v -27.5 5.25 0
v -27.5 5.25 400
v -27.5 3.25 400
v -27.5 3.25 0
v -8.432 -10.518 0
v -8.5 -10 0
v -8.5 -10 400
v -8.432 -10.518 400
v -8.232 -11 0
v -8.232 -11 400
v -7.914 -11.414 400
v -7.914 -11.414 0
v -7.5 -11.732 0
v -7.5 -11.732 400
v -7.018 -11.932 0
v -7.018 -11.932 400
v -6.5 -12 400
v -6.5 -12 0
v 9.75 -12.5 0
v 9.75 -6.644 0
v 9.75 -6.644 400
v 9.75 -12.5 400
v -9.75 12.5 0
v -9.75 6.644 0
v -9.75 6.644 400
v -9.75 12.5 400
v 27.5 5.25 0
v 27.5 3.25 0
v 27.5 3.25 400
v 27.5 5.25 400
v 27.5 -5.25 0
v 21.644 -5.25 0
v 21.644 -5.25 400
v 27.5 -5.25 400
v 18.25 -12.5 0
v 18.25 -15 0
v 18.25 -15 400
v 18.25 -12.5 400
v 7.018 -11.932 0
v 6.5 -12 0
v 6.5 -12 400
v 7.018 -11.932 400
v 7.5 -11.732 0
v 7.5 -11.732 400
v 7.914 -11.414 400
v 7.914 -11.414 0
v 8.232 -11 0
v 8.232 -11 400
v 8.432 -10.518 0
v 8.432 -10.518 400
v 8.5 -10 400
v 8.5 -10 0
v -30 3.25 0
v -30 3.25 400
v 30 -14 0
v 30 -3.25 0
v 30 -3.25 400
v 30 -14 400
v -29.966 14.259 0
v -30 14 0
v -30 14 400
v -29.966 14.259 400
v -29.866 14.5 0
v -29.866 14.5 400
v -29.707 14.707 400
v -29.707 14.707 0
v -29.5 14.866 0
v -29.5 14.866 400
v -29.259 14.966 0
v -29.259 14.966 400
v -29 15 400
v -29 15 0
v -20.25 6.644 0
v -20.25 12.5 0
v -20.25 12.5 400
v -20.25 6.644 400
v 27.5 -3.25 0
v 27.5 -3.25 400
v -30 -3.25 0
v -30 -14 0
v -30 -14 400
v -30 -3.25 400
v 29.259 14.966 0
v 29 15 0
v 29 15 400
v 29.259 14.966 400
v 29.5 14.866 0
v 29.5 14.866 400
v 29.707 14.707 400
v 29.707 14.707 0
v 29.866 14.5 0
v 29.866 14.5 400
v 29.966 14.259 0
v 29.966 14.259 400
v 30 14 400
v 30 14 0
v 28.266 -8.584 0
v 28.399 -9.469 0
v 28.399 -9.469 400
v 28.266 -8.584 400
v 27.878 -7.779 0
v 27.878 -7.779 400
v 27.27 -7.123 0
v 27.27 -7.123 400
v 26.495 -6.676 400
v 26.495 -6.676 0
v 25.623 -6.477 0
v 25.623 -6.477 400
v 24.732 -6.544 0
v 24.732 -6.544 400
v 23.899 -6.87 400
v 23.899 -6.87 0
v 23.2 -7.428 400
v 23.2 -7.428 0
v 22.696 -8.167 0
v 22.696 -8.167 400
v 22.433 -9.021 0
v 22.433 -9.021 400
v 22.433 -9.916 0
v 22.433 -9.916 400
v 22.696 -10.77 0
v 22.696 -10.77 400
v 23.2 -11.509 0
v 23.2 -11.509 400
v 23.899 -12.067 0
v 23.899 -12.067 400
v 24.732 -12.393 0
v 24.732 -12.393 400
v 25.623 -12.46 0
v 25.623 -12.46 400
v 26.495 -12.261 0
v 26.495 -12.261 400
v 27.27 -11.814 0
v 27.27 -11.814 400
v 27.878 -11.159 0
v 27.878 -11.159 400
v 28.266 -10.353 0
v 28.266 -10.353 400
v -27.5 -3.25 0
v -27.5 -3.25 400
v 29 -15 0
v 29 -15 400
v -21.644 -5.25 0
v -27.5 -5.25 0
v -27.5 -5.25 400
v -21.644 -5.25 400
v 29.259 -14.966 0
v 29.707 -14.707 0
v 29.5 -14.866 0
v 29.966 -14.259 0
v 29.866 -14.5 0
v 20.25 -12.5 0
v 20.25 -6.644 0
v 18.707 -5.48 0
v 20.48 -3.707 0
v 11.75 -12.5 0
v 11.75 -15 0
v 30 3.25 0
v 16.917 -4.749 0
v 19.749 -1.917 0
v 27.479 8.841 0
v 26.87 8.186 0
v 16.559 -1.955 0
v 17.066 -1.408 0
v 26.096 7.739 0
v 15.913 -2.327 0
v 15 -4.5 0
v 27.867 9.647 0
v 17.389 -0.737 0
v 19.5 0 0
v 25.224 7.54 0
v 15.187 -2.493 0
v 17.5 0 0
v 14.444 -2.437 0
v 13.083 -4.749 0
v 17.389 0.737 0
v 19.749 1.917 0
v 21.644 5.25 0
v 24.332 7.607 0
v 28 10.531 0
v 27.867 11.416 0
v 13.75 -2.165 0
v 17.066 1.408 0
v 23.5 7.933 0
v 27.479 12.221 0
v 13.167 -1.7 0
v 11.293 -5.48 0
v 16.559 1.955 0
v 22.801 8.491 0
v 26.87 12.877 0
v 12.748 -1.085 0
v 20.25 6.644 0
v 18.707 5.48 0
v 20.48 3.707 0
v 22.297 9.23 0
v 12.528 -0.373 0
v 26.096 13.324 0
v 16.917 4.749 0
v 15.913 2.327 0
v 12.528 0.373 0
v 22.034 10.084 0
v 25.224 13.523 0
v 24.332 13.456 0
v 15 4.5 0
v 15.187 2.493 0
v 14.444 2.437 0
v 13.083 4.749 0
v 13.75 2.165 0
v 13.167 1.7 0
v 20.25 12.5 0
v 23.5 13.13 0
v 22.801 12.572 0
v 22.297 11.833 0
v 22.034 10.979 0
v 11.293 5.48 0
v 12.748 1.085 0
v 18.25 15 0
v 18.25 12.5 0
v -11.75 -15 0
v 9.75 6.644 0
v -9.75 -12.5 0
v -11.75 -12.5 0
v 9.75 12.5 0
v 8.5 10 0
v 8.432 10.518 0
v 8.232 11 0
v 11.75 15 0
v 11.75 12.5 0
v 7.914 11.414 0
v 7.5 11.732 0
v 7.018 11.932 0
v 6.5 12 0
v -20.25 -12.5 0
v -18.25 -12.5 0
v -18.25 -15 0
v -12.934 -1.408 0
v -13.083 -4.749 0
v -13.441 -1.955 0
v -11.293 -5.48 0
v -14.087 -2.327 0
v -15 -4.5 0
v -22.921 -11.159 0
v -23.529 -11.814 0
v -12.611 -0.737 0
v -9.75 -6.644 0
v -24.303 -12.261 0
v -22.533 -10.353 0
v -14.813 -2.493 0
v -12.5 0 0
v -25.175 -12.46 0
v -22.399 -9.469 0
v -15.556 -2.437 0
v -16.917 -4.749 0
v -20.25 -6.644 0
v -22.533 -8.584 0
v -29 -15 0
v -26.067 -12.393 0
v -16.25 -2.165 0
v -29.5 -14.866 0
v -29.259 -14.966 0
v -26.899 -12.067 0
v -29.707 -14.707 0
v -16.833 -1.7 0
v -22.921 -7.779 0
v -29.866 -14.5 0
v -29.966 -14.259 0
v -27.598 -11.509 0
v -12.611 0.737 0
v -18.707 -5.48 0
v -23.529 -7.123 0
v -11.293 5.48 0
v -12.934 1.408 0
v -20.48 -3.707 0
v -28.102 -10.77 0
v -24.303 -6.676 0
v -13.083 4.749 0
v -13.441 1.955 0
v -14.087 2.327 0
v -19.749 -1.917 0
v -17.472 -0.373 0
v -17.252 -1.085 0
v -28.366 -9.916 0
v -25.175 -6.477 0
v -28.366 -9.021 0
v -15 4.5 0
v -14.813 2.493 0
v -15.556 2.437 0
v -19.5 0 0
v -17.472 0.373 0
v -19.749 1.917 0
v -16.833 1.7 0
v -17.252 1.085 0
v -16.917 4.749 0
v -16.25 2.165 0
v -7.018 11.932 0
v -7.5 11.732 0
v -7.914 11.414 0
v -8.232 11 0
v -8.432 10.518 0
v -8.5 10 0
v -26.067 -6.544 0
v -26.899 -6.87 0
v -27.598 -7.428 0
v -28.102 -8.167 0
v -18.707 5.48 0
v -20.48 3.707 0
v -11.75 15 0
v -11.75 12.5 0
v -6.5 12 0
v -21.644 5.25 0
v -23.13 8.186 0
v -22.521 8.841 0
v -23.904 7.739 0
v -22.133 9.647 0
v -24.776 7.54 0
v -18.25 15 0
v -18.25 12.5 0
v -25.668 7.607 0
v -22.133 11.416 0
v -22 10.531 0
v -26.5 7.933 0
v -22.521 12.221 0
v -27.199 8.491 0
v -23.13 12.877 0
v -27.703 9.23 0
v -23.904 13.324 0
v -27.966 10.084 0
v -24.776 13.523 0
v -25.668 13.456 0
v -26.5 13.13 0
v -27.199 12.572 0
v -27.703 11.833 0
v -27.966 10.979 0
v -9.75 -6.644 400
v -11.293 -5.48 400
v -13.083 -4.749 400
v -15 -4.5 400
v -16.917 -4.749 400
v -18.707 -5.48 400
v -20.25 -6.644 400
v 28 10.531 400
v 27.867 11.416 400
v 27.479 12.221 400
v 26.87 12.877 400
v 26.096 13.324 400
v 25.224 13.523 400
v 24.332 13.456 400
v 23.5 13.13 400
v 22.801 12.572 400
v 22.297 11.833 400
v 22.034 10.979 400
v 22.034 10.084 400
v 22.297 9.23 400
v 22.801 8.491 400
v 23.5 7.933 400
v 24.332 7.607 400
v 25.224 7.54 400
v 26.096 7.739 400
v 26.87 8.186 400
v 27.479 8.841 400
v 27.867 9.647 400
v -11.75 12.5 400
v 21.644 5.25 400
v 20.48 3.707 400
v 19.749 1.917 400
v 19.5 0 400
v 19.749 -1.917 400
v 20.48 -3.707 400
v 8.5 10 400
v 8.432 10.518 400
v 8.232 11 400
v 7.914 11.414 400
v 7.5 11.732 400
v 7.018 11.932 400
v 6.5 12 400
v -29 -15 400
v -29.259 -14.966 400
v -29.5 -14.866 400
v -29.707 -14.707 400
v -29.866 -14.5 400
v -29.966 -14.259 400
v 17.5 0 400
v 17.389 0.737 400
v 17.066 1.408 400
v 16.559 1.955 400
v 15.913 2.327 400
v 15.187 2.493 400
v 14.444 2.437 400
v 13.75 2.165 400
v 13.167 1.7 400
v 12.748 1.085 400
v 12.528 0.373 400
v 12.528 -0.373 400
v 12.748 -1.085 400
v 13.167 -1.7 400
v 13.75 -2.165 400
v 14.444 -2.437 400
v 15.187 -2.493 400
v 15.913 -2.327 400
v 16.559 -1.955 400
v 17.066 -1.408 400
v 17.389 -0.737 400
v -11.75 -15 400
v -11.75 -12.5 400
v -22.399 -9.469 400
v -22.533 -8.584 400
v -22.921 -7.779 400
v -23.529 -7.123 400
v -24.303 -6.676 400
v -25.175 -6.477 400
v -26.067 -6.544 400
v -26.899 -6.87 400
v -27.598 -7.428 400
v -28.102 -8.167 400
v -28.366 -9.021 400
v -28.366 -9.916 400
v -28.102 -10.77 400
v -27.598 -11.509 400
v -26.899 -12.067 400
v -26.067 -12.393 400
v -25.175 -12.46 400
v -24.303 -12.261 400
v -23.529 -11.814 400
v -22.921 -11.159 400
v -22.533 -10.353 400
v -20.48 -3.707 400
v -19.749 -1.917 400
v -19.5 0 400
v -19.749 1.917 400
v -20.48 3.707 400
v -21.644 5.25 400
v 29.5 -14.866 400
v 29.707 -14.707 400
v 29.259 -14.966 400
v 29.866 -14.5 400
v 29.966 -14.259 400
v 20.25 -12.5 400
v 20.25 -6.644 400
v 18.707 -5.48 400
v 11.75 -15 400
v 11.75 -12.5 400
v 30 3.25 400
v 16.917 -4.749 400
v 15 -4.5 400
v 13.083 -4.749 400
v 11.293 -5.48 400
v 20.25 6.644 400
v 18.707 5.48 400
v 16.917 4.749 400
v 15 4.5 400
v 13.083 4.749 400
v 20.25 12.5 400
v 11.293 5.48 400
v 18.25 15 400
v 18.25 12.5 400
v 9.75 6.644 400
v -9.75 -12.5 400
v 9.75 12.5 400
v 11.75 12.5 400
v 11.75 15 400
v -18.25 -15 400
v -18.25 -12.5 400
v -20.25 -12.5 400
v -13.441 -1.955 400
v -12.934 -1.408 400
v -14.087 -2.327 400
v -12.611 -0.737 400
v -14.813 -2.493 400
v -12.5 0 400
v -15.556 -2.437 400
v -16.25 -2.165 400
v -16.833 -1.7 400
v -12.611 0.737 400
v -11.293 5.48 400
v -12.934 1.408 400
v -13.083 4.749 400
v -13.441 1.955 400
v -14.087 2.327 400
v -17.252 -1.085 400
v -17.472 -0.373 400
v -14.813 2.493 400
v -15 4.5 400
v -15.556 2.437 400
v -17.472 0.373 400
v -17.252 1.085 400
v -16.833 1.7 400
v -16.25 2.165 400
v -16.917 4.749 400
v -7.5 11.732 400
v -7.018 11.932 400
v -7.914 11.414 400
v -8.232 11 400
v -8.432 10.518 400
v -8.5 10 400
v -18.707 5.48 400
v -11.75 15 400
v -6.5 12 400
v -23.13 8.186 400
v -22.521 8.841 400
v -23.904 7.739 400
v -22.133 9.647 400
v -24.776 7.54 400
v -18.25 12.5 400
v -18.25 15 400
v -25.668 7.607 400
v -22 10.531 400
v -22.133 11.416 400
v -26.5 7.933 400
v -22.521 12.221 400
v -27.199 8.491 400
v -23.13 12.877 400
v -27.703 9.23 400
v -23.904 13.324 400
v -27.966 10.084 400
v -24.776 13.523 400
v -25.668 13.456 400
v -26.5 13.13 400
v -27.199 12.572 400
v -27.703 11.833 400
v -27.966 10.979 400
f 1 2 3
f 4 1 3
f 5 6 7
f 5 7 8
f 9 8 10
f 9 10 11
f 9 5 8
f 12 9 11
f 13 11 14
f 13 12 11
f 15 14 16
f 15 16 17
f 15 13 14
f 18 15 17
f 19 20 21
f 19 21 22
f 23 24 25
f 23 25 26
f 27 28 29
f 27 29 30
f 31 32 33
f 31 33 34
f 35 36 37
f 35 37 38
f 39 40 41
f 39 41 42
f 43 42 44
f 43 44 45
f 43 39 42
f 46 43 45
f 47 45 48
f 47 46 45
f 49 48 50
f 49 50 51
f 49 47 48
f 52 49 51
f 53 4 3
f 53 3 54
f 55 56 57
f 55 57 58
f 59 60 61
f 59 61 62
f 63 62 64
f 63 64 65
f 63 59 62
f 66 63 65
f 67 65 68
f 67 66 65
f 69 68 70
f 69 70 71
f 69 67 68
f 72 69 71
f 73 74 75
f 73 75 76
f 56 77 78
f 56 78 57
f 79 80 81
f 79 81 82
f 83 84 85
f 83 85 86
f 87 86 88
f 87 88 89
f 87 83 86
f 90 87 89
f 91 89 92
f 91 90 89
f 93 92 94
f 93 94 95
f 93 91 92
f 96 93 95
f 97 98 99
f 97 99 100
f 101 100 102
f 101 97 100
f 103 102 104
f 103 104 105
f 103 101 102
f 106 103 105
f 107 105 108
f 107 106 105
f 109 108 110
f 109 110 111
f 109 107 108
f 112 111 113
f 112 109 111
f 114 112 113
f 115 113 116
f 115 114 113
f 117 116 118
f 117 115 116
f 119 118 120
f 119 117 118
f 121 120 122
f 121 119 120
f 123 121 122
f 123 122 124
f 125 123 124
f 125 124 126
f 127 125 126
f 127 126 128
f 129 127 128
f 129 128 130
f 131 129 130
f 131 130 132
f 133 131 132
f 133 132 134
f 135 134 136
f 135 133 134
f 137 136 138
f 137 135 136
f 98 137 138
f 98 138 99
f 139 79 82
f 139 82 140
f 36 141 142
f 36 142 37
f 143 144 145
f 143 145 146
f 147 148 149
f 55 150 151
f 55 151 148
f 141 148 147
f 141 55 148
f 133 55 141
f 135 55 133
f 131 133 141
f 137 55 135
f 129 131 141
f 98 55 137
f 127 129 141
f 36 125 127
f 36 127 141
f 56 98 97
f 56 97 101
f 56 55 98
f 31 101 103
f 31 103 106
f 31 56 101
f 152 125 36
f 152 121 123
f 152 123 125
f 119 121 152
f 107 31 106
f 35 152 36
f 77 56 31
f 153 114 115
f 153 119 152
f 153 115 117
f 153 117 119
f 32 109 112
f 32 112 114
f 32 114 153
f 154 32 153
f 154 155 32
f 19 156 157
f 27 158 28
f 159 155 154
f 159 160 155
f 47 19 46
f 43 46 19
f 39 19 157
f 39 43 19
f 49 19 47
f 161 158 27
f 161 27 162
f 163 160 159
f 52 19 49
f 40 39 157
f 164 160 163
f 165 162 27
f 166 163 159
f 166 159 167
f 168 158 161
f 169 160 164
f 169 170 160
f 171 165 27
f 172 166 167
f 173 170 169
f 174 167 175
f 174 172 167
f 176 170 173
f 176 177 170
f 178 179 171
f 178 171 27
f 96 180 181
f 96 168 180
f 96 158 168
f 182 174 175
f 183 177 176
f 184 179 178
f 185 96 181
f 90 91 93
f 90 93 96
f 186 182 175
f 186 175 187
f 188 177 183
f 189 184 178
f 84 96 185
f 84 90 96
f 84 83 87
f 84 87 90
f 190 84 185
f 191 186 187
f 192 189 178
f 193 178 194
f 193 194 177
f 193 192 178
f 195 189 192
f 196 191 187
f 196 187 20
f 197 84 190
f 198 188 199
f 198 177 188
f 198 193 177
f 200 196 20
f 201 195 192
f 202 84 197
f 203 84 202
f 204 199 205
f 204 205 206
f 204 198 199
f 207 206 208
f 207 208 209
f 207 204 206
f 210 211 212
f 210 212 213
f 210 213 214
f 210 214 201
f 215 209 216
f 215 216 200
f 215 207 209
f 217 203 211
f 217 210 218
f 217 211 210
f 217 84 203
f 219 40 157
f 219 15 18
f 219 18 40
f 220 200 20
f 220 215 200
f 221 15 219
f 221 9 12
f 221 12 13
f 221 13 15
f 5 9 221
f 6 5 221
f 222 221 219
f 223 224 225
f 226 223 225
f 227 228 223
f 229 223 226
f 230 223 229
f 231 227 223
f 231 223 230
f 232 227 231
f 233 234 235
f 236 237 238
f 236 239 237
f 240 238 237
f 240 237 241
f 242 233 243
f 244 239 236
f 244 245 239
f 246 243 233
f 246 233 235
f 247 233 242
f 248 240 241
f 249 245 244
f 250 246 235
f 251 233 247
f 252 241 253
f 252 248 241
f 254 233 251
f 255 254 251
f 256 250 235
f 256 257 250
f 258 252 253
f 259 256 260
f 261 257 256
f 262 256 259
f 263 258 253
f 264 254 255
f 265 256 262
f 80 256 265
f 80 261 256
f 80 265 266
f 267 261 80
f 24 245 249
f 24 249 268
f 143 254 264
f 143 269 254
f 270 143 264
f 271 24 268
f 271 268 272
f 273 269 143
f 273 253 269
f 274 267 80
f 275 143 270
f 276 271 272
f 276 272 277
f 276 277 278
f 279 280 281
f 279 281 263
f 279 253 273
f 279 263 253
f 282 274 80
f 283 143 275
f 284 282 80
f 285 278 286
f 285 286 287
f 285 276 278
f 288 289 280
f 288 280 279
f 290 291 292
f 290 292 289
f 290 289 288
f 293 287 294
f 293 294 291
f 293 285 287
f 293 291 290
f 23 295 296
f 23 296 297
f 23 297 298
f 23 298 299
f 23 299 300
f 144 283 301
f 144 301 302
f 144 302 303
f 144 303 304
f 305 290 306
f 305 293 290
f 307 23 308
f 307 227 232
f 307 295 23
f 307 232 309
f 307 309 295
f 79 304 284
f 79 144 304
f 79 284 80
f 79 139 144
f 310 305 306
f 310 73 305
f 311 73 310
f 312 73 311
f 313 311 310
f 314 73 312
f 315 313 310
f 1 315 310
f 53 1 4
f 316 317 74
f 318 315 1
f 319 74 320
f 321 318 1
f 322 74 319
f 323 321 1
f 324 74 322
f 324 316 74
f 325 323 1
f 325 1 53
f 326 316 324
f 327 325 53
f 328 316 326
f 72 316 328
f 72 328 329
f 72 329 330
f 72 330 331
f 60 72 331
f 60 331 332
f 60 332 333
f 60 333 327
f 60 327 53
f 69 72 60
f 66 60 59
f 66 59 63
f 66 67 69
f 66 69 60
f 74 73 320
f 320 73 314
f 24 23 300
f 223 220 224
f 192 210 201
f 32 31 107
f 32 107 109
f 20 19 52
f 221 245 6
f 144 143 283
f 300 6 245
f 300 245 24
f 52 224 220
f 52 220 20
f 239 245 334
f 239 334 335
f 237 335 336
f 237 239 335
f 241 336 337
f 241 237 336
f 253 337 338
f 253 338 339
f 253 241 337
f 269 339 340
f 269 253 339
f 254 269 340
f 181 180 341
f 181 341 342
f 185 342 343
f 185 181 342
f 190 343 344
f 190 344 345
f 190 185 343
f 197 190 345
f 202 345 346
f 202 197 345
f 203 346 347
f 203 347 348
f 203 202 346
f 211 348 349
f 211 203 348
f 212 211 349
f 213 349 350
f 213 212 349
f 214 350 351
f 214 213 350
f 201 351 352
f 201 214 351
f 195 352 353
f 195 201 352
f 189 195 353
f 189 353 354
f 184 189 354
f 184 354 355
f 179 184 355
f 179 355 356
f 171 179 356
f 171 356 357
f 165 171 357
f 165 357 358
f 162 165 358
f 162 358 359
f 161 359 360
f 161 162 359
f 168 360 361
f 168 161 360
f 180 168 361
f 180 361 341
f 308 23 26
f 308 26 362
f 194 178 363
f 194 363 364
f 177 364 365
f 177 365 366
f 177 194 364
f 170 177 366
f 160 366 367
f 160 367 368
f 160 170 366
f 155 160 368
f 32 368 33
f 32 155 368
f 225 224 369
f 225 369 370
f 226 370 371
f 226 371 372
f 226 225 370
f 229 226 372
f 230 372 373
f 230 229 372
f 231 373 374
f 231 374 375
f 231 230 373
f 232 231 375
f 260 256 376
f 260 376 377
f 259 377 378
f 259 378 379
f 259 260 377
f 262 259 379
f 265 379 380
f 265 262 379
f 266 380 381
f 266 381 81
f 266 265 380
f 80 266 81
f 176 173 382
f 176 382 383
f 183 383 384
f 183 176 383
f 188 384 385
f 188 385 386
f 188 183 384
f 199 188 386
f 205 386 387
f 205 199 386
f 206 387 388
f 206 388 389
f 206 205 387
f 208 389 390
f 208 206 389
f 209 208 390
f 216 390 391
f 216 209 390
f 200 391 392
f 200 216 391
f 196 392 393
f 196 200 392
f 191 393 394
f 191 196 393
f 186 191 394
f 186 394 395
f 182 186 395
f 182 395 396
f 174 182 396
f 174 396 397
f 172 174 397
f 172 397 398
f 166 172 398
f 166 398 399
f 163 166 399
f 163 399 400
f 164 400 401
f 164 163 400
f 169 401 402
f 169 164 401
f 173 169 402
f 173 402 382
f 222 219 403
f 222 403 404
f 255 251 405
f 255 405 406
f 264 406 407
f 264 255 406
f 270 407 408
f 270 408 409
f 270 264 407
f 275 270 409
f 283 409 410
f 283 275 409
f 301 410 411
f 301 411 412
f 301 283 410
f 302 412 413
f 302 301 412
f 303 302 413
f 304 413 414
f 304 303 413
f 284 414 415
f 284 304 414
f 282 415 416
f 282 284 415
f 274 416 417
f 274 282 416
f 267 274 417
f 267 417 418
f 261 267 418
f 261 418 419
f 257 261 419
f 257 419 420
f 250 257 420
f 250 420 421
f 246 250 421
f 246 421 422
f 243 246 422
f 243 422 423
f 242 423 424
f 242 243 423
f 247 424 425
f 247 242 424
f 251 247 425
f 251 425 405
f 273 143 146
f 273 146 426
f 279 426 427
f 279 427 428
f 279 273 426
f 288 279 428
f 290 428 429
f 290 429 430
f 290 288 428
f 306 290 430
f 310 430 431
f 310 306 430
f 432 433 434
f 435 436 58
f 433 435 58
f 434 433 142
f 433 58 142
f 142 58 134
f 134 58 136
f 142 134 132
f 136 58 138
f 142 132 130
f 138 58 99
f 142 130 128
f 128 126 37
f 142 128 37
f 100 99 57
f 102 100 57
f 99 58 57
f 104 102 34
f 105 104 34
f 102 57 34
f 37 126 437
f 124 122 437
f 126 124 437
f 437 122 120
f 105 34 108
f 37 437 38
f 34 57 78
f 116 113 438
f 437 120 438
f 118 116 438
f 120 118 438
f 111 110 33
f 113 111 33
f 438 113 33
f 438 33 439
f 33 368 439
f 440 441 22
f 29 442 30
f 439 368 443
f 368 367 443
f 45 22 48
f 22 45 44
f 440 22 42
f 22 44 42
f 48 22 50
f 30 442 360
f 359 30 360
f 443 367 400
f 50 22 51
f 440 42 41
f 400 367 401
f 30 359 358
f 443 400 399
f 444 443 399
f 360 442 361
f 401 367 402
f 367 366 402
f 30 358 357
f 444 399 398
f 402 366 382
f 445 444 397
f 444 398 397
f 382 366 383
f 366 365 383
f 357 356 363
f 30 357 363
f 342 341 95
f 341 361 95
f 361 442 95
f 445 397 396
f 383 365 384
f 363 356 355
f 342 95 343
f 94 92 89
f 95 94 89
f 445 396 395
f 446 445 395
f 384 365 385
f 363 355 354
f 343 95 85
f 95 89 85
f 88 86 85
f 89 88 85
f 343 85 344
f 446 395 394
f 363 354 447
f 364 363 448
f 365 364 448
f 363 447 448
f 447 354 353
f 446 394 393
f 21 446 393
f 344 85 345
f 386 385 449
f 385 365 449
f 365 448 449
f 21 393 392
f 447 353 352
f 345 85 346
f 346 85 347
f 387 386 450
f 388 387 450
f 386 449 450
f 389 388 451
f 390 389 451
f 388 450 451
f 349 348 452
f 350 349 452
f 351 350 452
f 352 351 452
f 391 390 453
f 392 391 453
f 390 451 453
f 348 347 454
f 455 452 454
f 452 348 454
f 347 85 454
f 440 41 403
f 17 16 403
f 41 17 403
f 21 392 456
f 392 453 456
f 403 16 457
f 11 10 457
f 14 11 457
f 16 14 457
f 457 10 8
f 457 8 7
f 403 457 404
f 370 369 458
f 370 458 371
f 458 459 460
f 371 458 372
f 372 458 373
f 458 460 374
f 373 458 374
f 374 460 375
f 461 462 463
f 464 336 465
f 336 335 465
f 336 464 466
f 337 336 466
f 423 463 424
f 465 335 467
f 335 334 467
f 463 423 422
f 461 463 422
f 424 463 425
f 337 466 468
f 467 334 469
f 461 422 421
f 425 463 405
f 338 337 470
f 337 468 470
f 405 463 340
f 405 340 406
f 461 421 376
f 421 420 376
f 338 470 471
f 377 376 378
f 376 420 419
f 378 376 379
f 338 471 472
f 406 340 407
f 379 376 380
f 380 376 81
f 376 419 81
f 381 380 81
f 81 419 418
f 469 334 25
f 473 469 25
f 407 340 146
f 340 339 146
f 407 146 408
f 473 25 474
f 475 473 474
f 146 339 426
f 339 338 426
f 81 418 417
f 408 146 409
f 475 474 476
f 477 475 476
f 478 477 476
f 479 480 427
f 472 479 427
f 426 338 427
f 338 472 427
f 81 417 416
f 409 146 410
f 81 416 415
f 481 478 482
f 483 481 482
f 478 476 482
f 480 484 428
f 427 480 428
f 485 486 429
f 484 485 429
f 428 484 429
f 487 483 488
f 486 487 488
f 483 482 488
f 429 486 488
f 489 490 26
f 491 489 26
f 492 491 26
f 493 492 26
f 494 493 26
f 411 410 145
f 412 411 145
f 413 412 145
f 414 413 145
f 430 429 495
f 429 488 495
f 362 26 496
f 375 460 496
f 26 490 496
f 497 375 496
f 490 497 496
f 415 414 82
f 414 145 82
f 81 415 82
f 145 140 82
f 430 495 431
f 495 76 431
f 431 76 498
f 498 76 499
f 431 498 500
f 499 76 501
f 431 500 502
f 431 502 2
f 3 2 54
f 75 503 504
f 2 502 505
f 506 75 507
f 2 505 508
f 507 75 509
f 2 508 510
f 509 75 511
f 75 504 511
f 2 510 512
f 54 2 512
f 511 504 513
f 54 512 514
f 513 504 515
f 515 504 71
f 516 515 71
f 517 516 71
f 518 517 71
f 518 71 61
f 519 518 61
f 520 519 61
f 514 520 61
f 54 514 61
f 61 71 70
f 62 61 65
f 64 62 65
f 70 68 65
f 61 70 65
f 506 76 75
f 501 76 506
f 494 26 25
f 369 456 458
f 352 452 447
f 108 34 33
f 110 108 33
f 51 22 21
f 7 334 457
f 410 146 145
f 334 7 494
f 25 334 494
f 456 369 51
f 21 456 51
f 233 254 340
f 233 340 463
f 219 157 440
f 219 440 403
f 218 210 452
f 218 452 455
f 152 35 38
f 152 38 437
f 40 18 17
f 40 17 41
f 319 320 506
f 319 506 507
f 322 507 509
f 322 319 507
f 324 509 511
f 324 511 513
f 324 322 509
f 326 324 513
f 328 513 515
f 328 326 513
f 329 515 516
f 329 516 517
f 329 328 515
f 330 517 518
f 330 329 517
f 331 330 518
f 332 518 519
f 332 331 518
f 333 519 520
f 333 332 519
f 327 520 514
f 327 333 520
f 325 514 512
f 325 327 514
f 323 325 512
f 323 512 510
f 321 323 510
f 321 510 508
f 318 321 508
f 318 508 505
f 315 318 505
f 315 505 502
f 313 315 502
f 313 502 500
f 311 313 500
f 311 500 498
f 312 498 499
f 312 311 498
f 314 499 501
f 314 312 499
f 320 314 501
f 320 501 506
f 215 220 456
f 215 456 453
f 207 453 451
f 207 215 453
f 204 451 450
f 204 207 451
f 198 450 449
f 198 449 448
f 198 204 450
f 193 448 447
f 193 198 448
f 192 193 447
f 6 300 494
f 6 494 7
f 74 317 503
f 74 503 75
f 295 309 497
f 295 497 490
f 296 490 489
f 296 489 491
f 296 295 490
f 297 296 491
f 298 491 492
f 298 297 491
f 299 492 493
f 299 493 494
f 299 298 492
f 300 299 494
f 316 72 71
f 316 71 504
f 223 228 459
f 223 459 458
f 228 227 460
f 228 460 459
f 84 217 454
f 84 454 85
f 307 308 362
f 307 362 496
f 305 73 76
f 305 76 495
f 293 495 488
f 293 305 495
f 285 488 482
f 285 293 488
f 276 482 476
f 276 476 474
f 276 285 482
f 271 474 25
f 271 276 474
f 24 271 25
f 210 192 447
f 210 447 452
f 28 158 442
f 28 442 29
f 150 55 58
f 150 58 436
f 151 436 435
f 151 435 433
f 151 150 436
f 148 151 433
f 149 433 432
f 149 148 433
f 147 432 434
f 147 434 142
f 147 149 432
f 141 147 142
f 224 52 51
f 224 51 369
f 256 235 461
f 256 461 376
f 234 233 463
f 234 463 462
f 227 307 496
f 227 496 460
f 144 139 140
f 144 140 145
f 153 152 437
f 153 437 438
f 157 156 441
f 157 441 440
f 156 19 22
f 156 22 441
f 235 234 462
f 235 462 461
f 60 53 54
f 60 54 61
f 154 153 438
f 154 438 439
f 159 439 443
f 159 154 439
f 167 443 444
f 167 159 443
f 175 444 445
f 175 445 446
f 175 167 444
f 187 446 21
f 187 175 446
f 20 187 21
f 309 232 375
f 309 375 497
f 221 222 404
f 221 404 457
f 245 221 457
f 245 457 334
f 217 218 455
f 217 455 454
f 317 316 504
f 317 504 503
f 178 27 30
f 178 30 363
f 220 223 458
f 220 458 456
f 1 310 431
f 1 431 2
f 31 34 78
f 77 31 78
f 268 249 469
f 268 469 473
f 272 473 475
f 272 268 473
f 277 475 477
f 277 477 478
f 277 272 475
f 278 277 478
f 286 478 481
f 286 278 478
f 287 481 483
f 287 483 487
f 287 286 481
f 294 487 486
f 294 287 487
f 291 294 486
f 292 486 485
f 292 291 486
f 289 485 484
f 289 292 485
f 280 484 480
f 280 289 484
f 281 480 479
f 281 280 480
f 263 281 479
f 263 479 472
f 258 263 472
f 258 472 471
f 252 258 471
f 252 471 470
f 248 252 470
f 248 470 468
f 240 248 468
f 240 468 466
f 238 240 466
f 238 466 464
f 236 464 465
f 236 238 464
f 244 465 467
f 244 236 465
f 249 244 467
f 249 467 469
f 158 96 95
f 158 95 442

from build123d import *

# Parameters (mm, degrees)
MODEL_R             = 2.5
MODEL_R_2           = 3
BOSS_EXTRUDE1_DEPTH = 400


with BuildPart() as part:
    # Model → Boss-Extrude1 (new body)
    with BuildSketch(Plane.XY):
        with BuildLine():
            Line((-27.5, 3.25), (-30, 3.25))
            Line((-30, 3.25), (-30, 14))
            ThreePointArc((-30, 14), (-29.707106781, 14.707106781), (-29, 15))
            Line((-29, 15), (-18.25, 15))
            Line((-18.25, 15), (-18.25, 12.5))
            Line((-18.25, 12.5), (-20.25, 12.5))
            Line((-20.25, 12.5), (-20.25, 6.643928679))
            ThreePointArc((-20.25, 6.643928679), (-15, 4.5), (-9.75, 6.643928679))
            Line((-9.75, 6.643928679), (-9.75, 12.5))
            Line((-9.75, 12.5), (-11.75, 12.5))
            Line((-11.75, 12.5), (-11.75, 15))
            Line((-11.75, 15), (11.75, 15))
            Line((11.75, 15), (11.75, 12.5))
            Line((11.75, 12.5), (9.75, 12.5))
            Line((9.75, 12.5), (9.75, 6.643928679))
            ThreePointArc((9.75, 6.643928679), (15, 4.5), (20.25, 6.643928679))
            Line((20.25, 6.643928679), (20.25, 12.5))
            Line((20.25, 12.5), (18.25, 12.5))
            Line((18.25, 12.5), (18.25, 15))
            Line((18.25, 15), (29, 15))
            ThreePointArc((29, 15), (29.707106781, 14.707106781), (30, 14))
            Line((30, 14), (30, 3.25))
            Line((30, 3.25), (27.5, 3.25))
            Line((27.5, 3.25), (27.5, 5.25))
            Line((27.5, 5.25), (21.643928679, 5.25))
            ThreePointArc((21.643928679, 5.25), (19.5, 0), (21.643928679, -5.25))
            Line((21.643928679, -5.25), (27.5, -5.25))
            Line((27.5, -5.25), (27.5, -3.25))
            Line((27.5, -3.25), (30, -3.25))
            Line((30, -3.25), (30, -14))
            ThreePointArc((30, -14), (29.707106781, -14.707106781), (29, -15))
            Line((29, -15), (18.25, -15))
            Line((18.25, -15), (18.25, -12.5))
            Line((18.25, -12.5), (20.25, -12.5))
            Line((20.25, -12.5), (20.25, -6.643928679))
            ThreePointArc((20.25, -6.643928679), (15, -4.5), (9.75, -6.643928679))
            Line((9.75, -6.643928679), (9.75, -12.5))
            Line((9.75, -12.5), (11.75, -12.5))
            Line((11.75, -12.5), (11.75, -15))
            Line((11.75, -15), (-11.75, -15))
            Line((-11.75, -15), (-11.75, -12.5))
            Line((-11.75, -12.5), (-9.75, -12.5))
            Line((-9.75, -12.5), (-9.75, -6.643928679))
            ThreePointArc((-9.75, -6.643928679), (-15, -4.5), (-20.25, -6.643928679))
            Line((-20.25, -6.643928679), (-20.25, -12.5))
            Line((-20.25, -12.5), (-18.25, -12.5))
            Line((-18.25, -12.5), (-18.25, -15))
            Line((-18.25, -15), (-29, -15))
            ThreePointArc((-29, -15), (-29.707106781, -14.707106781), (-30, -14))
            Line((-30, -14), (-30, -3.25))
            Line((-30, -3.25), (-27.5, -3.25))
            Line((-27.5, -3.25), (-27.5, -5.25))
            Line((-27.5, -5.25), (-21.643928679, -5.25))
            ThreePointArc((-21.643928679, -5.25), (-19.5, 0), (-21.643928679, 5.25))
            Line((-21.643928679, 5.25), (-27.5, 5.25))
            Line((-27.5, 5.25), (-27.5, 3.25))
        make_face()
        with Locations((-15, 0)):
            Circle(MODEL_R, mode=Mode.SUBTRACT)
        with Locations((-25, 10.531430074)):
            Circle(MODEL_R_2, mode=Mode.SUBTRACT)
        with Locations((-25.399251578, -9.468569926)):
            Circle(MODEL_R_2, mode=Mode.SUBTRACT)
        with Locations((25.399251578, -9.468569926)):
            Circle(MODEL_R_2, mode=Mode.SUBTRACT)
        with Locations((15, 0)):
            Circle(MODEL_R, mode=Mode.SUBTRACT)
        with Locations((25, 10.531430074)):
            Circle(MODEL_R_2, mode=Mode.SUBTRACT)
        with BuildLine():
            Line((6.5, 12), (-6.5, 12))
            ThreePointArc((-6.5, 12), (-7.914213562, 11.414213562), (-8.5, 10))
            Line((-8.5, 10), (-8.5, -10))
            ThreePointArc((-8.5, -10), (-7.914213562, -11.414213562), (-6.5, -12))
            Line((-6.5, -12), (6.5, -12))
            ThreePointArc((6.5, -12), (7.914213562, -11.414213562), (8.5, -10))
            Line((8.5, -10), (8.5, 10))
            ThreePointArc((8.5, 10), (7.914213562, 11.414213562), (6.5, 12))
        make_face(mode=Mode.SUBTRACT)
    extrude(amount=BOSS_EXTRUDE1_DEPTH)


solid = part.part
